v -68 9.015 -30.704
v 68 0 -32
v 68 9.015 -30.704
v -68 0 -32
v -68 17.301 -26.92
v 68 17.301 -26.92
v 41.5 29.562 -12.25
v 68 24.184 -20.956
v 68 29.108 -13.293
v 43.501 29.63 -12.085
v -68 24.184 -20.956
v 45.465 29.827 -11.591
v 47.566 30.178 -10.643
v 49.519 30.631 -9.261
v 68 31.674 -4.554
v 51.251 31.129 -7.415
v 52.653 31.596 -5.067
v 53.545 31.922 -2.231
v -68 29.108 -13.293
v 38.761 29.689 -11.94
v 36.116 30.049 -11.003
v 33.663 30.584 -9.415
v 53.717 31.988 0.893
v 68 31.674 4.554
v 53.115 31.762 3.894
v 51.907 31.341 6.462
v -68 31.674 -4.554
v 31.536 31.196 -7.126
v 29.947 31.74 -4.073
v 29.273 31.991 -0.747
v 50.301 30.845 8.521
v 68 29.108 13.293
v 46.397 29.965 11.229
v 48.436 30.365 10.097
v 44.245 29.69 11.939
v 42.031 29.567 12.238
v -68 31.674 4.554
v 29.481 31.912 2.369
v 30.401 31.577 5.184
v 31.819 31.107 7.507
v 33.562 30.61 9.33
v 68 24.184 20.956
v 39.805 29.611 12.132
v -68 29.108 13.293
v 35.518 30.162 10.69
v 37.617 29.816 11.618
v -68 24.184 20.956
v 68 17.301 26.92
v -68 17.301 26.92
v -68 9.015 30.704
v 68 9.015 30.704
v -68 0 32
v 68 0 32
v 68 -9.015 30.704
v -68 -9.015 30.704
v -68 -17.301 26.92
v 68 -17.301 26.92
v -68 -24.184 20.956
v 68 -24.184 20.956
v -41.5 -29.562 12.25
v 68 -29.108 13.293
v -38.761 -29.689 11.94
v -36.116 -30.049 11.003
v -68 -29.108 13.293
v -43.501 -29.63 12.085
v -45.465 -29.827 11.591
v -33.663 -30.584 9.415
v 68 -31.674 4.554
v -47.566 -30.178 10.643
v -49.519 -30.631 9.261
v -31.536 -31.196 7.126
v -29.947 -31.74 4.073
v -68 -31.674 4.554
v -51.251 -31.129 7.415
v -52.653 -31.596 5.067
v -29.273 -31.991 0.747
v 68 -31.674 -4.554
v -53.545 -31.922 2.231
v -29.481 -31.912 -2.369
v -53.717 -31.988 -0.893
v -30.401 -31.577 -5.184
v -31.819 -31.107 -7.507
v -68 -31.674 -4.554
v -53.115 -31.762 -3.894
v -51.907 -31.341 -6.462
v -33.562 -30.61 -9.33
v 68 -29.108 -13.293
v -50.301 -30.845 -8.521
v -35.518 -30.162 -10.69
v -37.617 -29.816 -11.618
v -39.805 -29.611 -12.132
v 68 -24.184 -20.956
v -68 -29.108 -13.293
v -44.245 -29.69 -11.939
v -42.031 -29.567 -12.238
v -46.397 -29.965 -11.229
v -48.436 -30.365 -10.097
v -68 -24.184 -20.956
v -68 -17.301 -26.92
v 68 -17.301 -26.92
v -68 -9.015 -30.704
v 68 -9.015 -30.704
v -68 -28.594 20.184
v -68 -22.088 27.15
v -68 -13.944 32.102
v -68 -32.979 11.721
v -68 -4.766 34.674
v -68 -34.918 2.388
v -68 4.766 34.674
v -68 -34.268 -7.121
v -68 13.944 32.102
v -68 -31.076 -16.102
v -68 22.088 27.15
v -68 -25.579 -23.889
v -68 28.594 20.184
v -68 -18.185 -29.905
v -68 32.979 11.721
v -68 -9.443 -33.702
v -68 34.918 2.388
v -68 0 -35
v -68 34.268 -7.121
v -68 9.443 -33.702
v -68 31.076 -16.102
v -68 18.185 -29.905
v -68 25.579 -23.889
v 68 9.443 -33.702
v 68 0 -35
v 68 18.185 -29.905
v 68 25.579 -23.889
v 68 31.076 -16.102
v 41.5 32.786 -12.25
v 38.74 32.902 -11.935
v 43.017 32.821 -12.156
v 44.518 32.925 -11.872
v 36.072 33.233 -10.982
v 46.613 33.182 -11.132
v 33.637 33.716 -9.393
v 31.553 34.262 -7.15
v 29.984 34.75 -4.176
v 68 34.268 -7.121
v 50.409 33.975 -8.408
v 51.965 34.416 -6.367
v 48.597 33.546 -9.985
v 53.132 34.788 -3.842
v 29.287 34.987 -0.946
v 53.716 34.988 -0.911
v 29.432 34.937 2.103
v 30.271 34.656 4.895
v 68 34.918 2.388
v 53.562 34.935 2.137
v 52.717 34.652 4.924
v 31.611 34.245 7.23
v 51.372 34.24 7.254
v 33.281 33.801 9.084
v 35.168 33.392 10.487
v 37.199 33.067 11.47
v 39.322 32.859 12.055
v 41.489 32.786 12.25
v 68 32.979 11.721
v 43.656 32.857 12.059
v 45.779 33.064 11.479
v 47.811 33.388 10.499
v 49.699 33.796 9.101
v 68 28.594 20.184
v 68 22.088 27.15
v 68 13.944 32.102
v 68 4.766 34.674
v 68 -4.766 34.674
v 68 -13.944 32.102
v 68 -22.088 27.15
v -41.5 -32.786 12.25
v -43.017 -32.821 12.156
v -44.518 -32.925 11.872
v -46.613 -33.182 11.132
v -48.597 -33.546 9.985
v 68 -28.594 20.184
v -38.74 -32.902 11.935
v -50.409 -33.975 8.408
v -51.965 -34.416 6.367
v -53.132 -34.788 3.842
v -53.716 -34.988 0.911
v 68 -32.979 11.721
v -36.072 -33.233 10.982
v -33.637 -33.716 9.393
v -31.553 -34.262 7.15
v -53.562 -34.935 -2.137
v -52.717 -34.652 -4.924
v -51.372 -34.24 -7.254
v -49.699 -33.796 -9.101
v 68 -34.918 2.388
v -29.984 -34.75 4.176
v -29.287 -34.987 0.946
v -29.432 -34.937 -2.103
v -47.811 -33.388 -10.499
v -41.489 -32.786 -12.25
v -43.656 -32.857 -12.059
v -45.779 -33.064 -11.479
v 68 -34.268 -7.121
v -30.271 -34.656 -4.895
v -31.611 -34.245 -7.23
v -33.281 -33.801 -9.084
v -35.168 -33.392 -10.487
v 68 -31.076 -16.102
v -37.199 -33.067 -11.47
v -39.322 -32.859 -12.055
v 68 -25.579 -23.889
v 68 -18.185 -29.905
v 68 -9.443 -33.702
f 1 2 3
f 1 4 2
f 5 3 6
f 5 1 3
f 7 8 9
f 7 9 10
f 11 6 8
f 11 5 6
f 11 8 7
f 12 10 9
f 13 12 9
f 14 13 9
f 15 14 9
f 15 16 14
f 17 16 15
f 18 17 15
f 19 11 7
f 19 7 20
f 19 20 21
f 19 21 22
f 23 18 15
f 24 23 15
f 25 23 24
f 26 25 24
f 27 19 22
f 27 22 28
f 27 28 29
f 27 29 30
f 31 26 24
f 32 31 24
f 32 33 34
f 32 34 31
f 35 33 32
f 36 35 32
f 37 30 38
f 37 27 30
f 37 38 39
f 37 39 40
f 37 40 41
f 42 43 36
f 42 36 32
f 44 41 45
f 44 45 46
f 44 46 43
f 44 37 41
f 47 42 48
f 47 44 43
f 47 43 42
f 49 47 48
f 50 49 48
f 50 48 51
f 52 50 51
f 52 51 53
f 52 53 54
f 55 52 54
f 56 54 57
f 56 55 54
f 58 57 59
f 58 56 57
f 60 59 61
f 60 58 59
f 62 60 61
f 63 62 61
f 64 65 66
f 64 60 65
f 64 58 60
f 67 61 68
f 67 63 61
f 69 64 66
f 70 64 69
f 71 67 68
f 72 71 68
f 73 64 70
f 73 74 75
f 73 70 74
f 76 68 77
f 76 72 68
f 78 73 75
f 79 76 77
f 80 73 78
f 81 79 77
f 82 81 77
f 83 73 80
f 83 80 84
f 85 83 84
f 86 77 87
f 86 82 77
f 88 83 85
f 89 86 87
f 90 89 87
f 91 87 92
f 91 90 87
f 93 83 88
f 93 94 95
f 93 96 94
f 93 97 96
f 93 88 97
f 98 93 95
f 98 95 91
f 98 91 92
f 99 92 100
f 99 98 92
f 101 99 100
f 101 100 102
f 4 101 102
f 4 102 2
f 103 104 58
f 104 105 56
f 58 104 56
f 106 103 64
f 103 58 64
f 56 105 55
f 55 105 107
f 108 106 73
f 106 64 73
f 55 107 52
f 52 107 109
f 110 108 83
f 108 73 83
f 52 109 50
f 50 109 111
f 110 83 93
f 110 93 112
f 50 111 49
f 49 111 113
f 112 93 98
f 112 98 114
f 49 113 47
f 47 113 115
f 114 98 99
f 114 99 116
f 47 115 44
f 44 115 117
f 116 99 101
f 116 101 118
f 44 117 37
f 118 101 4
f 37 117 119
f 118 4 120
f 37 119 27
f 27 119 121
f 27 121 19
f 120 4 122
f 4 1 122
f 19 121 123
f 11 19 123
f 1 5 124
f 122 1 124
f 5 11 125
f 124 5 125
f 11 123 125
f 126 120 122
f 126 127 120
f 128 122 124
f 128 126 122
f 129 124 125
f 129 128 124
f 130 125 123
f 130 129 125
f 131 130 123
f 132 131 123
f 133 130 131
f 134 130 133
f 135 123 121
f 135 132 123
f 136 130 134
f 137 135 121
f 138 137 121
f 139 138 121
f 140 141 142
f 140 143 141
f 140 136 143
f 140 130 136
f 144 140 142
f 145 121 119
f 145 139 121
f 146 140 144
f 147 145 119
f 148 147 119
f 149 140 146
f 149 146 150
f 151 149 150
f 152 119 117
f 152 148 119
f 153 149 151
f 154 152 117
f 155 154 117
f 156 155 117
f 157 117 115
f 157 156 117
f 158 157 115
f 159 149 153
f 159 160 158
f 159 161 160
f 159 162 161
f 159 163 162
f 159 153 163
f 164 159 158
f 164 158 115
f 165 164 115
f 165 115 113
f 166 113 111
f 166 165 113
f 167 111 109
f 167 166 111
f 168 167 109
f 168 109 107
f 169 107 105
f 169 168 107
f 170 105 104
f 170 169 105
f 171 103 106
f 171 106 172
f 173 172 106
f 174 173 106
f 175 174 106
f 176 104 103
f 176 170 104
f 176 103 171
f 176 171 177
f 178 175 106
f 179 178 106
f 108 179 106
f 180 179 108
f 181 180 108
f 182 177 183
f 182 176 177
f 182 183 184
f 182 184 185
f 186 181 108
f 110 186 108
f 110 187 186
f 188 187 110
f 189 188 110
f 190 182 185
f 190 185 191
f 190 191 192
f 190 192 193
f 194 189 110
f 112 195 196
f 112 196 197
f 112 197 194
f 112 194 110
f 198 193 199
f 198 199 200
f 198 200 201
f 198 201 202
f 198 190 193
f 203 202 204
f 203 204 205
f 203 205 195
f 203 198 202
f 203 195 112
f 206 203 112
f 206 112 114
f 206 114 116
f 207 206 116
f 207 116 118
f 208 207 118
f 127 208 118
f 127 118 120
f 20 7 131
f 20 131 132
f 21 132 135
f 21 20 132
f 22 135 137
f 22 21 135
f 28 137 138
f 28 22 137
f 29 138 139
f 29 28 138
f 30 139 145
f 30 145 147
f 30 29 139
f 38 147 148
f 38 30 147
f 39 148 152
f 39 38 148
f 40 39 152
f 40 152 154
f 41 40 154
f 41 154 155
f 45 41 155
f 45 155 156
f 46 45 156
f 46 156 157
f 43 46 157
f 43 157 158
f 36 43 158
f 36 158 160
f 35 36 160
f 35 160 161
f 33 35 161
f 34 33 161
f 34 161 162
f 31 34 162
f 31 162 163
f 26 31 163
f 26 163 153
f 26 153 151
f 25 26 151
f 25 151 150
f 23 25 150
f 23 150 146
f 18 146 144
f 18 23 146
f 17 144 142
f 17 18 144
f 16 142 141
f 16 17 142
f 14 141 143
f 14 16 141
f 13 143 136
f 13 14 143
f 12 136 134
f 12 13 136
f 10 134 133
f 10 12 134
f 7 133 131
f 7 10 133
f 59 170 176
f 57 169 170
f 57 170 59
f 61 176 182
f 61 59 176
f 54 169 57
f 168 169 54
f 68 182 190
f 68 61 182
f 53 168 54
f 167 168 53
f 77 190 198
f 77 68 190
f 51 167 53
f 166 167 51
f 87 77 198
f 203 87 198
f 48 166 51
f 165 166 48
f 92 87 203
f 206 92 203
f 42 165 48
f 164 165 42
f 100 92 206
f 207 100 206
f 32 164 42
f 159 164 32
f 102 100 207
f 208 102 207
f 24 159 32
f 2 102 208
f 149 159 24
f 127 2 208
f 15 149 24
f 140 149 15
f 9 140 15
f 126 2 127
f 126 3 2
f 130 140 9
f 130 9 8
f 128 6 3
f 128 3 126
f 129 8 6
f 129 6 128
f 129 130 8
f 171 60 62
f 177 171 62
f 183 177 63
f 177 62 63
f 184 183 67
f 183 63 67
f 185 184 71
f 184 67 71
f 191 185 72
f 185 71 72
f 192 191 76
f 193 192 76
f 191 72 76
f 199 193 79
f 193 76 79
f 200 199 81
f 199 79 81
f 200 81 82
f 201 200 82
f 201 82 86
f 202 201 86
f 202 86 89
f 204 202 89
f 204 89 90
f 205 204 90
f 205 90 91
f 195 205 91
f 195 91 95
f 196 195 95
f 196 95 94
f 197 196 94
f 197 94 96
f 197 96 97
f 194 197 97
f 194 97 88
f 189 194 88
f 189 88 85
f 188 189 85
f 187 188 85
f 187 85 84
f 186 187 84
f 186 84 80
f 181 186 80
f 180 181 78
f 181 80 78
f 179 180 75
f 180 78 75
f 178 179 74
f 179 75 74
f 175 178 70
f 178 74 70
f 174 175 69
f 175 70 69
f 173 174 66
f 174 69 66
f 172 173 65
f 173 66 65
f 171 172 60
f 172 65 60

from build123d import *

# Parameters (mm, degrees)
SKETCH3_R           = 35
SKETCH3_R_2         = 32
BOSS_EXTRUDE1_DEPTH = 68
SKETCH4_R           = 12.25
CUT_EXTRUDE1_DEPTH  = 85.107074613
SKETCH5_R           = 12.25
CUT_EXTRUDE2_DEPTH  = 85.107074777


with BuildPart() as part:
    # Sketch3 → Boss-Extrude1 (new, symmetric)
    with BuildSketch(Plane(origin=(0, 0, 0), x_dir=(0, 0, -1), z_dir=(1, 0, 0))):
        Circle(SKETCH3_R)
        Circle(SKETCH3_R_2, mode=Mode.SUBTRACT)
    extrude(amount=BOSS_EXTRUDE1_DEPTH, both=True)

    # Sketch4 → Cut-Extrude1 (cut, through all)
    with BuildSketch(Plane(origin=(0, 0, 0), x_dir=(1, 0, 0), z_dir=(0, 1, 0))):
        with Locations(Location((-41.5, 0, 0), (0, 0, 270))):
            Circle(SKETCH4_R)
    extrude(amount=-CUT_EXTRUDE1_DEPTH, mode=Mode.SUBTRACT)

    # Sketch5 → Cut-Extrude2 (cut, through all)
    with BuildSketch(Plane(origin=(0, 0, 0), x_dir=(1, 0, 0), z_dir=(0, 1, 0))):
        with Locations(Location((41.5, 0, 0), (0, 0, 90))):
            Circle(SKETCH5_R)
    extrude(amount=CUT_EXTRUDE2_DEPTH, mode=Mode.SUBTRACT)


solid = part.part
